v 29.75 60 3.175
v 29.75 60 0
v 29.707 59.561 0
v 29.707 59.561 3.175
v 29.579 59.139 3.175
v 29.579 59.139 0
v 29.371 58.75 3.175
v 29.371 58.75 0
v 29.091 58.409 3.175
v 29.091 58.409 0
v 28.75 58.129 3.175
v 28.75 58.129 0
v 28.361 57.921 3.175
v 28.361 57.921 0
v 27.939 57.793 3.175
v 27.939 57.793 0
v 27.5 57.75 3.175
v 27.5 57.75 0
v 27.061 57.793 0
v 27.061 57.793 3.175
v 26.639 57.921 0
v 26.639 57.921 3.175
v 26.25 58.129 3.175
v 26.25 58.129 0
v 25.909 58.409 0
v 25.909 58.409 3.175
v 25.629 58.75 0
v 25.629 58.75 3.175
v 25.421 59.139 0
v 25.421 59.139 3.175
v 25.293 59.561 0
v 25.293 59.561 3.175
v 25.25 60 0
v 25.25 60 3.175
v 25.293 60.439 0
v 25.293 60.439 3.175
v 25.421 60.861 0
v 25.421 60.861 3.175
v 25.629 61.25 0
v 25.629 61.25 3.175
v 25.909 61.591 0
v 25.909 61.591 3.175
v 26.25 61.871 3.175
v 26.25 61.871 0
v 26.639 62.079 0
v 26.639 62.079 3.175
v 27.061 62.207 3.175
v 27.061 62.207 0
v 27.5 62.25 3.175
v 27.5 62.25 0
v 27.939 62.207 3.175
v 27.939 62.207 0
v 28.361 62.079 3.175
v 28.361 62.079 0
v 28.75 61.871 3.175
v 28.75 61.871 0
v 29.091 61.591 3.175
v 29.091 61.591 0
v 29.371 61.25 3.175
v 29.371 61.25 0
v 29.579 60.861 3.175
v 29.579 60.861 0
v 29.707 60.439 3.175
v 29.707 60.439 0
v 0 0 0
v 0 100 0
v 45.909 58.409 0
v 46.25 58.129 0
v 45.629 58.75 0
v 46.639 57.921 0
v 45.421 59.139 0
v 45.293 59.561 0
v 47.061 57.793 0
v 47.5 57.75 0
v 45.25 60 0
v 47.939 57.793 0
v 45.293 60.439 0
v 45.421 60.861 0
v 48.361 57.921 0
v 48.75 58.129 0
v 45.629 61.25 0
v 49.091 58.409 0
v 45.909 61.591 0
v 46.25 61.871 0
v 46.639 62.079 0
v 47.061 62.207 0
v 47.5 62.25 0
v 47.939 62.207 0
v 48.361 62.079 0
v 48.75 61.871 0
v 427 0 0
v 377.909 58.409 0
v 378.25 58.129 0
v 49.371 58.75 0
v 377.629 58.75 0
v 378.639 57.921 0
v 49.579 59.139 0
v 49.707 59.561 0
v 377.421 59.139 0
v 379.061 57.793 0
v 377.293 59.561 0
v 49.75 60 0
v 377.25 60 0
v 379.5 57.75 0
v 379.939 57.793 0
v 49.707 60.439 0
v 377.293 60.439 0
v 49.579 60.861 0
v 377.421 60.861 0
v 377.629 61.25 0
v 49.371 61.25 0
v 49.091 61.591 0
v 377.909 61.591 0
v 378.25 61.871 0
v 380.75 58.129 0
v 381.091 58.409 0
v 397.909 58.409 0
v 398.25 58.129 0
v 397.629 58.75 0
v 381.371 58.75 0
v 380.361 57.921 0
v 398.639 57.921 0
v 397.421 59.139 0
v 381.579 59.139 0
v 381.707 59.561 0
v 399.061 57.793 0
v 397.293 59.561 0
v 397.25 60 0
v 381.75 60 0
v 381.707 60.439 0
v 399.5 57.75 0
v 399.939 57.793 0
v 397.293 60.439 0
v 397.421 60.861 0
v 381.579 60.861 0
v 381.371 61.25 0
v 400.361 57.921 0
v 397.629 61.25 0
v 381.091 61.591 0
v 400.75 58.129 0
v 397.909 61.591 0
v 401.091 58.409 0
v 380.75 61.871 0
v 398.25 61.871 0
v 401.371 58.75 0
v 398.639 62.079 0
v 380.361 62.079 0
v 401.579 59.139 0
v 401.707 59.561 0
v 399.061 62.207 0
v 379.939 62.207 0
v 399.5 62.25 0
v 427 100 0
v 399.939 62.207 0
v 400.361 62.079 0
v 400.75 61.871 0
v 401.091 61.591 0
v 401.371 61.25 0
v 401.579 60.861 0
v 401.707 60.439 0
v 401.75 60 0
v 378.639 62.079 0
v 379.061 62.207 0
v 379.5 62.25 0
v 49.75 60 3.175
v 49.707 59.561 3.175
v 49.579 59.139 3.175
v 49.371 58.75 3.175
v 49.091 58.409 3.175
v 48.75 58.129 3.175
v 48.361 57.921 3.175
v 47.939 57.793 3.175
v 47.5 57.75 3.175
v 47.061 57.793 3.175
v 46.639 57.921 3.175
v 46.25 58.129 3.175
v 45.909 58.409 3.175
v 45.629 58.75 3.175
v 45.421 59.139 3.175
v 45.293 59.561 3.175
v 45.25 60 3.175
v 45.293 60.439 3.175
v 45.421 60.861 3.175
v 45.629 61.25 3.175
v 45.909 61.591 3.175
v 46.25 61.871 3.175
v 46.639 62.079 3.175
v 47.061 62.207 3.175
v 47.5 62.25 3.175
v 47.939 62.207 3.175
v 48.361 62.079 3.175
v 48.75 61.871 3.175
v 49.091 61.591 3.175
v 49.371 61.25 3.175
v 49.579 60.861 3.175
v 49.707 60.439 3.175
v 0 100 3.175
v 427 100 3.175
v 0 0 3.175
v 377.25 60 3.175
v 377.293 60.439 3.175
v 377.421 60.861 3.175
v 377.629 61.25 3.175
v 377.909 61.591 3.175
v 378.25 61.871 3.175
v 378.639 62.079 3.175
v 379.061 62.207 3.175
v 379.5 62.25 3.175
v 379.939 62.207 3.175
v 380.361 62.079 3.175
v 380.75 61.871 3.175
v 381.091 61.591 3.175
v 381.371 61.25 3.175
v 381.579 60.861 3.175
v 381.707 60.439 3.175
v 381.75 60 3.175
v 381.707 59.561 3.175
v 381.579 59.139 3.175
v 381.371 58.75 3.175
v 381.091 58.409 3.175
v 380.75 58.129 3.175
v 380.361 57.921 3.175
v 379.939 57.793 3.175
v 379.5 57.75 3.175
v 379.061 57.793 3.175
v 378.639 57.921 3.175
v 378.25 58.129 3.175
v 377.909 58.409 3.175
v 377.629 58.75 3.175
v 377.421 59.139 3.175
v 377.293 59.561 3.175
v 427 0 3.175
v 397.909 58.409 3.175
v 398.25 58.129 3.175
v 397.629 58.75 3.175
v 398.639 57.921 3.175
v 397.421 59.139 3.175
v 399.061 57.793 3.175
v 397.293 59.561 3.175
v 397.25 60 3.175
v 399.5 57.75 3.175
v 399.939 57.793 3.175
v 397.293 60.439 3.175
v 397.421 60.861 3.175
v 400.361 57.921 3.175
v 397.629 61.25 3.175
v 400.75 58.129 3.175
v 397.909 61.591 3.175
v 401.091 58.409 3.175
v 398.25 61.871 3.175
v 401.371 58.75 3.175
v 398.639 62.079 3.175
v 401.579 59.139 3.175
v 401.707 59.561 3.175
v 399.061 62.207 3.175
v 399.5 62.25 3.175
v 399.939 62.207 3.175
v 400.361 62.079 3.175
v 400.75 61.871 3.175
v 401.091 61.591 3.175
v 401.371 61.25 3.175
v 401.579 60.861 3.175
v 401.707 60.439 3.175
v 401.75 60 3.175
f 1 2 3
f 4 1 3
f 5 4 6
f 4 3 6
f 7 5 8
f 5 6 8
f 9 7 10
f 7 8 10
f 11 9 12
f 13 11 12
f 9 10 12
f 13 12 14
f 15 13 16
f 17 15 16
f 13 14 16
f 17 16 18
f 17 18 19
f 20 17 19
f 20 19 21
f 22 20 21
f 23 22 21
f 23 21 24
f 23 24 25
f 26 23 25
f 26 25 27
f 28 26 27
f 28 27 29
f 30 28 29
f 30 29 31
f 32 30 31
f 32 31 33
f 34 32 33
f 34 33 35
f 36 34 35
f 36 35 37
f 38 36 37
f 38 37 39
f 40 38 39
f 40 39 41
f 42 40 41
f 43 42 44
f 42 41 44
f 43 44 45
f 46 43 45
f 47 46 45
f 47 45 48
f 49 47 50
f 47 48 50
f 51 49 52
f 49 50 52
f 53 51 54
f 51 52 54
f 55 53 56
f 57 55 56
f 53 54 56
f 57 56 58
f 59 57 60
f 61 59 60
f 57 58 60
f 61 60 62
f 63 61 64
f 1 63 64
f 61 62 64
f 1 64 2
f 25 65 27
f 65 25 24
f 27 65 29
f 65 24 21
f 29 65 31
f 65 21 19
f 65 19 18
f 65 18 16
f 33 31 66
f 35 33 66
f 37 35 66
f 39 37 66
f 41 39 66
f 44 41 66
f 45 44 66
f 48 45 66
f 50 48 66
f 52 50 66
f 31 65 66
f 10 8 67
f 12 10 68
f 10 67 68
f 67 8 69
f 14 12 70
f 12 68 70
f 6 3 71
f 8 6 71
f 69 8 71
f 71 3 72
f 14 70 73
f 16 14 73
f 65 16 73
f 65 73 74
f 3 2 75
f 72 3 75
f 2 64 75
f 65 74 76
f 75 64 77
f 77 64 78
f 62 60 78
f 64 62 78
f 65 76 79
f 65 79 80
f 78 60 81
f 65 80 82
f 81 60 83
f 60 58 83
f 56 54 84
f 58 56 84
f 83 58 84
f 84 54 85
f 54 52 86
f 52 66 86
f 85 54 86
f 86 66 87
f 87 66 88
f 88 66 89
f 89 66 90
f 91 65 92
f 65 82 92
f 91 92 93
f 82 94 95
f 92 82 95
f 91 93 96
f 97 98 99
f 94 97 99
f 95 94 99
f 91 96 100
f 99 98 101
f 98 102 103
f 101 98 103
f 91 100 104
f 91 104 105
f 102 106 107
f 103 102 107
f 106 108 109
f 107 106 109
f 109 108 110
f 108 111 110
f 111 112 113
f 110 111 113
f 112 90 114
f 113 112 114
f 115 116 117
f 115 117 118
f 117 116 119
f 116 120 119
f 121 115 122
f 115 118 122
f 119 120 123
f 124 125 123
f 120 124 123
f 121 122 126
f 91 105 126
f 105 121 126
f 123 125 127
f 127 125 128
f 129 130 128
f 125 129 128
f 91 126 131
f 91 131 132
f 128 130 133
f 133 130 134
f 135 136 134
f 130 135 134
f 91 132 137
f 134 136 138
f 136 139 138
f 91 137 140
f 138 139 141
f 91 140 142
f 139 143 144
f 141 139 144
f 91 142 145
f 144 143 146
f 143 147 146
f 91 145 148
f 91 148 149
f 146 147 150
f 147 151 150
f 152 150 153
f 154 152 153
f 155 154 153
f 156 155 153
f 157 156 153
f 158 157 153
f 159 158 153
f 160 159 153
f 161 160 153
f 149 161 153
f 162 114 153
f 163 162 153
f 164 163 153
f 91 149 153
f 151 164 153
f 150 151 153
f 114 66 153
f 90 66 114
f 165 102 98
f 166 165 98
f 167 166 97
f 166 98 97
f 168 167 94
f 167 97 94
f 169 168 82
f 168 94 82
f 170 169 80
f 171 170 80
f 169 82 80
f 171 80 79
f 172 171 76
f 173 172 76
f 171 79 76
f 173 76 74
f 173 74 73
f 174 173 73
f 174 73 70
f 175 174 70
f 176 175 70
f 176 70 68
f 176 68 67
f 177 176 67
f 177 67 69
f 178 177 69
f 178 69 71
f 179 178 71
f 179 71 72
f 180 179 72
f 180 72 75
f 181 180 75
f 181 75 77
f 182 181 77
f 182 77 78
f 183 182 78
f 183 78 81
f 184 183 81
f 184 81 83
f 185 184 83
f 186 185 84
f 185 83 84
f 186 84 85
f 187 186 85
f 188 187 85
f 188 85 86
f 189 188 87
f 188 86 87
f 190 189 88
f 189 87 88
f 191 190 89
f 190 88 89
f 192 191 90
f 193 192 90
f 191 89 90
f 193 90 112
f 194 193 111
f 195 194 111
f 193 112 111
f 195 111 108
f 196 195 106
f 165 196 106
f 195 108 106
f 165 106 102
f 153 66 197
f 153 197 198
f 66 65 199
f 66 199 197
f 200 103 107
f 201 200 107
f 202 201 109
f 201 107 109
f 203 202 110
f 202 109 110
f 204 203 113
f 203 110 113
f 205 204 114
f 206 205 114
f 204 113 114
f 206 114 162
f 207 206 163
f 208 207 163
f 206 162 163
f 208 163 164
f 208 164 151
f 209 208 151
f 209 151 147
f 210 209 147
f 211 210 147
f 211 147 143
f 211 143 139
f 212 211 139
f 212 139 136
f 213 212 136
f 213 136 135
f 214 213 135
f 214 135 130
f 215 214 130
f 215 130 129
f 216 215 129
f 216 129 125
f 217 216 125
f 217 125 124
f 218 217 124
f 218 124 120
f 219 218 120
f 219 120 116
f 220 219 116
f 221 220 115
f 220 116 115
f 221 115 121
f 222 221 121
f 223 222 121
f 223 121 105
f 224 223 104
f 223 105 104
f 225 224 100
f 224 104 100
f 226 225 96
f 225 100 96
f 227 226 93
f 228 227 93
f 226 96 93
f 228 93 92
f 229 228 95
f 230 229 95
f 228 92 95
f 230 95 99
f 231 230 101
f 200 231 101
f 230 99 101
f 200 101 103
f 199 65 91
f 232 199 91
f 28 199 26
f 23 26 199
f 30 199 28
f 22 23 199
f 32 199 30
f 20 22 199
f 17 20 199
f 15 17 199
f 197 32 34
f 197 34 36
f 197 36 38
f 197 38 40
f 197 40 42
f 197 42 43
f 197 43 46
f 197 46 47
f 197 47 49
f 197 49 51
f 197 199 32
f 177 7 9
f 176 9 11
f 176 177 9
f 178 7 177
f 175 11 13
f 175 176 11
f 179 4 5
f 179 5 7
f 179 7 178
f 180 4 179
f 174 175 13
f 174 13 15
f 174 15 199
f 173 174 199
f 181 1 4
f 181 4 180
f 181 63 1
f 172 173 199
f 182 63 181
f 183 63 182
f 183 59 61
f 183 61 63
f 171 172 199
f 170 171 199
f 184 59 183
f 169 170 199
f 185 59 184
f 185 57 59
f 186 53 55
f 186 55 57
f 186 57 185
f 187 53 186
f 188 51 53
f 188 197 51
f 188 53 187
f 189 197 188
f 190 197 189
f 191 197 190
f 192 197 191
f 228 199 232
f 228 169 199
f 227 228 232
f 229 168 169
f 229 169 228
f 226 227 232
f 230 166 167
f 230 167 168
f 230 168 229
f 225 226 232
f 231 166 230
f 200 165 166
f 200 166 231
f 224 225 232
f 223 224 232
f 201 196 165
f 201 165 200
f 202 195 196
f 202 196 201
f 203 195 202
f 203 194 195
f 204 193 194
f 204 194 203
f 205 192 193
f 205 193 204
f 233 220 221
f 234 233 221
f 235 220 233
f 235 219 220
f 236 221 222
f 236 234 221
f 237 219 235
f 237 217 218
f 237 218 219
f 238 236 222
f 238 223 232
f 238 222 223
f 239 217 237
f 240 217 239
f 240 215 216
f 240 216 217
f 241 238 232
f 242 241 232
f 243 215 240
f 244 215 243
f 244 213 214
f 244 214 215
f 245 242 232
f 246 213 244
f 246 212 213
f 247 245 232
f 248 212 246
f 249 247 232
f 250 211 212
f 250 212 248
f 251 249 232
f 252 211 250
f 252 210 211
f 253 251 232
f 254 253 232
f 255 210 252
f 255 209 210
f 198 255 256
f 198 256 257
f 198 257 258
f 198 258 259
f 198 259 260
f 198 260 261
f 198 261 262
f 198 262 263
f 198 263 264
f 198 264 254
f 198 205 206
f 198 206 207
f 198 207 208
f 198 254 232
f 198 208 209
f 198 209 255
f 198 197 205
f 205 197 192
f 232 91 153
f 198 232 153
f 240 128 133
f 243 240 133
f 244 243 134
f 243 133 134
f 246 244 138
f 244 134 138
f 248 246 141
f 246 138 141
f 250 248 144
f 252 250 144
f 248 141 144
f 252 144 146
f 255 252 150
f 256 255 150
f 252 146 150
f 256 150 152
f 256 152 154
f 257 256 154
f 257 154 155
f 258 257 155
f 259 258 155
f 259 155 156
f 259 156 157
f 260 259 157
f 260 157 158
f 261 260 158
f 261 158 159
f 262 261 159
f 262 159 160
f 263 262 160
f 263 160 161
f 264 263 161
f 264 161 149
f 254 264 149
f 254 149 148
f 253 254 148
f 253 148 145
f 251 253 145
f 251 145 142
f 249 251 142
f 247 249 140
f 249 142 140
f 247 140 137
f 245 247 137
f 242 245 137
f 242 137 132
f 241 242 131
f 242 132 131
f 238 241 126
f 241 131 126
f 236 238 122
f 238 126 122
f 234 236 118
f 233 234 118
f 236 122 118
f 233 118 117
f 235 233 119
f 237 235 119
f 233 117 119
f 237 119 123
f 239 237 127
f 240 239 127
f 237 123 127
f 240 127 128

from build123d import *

# Parameters (mm, degrees)
SKETCH1_W           = 427
SKETCH1_H           = 100
BOSS_EXTRUDE1_DEPTH = 3.175
SKETCH2_R           = 2.25
CUT_EXTRUDE1_DEPTH  = 439.564796381


with BuildPart() as part:
    # Sketch1 → Boss-Extrude1 (new body)
    with BuildSketch(Plane.XY):
        with Locations((213.5, 50)):
            Rectangle(SKETCH1_W, SKETCH1_H)
    extrude(amount=BOSS_EXTRUDE1_DEPTH)

    # Sketch2 → Cut-Extrude1 (cut, through all)
    with BuildSketch(Plane(origin=(0, 0, 0), x_dir=(-1, 0, 0), z_dir=(0, 0, -1))):
        with Locations((-399.5, 60)):
            Circle(SKETCH2_R)
        with Locations((-379.5, 60)):
            Circle(SKETCH2_R)
        with Locations(Location((-27.5, 60, 0), (0, 0, 180))):
            Circle(SKETCH2_R)
        with Locations(Location((-47.5, 60, 0), (0, 0, 180))):
            Circle(SKETCH2_R)
    extrude(amount=-CUT_EXTRUDE1_DEPTH, mode=Mode.SUBTRACT)


solid = part.part
